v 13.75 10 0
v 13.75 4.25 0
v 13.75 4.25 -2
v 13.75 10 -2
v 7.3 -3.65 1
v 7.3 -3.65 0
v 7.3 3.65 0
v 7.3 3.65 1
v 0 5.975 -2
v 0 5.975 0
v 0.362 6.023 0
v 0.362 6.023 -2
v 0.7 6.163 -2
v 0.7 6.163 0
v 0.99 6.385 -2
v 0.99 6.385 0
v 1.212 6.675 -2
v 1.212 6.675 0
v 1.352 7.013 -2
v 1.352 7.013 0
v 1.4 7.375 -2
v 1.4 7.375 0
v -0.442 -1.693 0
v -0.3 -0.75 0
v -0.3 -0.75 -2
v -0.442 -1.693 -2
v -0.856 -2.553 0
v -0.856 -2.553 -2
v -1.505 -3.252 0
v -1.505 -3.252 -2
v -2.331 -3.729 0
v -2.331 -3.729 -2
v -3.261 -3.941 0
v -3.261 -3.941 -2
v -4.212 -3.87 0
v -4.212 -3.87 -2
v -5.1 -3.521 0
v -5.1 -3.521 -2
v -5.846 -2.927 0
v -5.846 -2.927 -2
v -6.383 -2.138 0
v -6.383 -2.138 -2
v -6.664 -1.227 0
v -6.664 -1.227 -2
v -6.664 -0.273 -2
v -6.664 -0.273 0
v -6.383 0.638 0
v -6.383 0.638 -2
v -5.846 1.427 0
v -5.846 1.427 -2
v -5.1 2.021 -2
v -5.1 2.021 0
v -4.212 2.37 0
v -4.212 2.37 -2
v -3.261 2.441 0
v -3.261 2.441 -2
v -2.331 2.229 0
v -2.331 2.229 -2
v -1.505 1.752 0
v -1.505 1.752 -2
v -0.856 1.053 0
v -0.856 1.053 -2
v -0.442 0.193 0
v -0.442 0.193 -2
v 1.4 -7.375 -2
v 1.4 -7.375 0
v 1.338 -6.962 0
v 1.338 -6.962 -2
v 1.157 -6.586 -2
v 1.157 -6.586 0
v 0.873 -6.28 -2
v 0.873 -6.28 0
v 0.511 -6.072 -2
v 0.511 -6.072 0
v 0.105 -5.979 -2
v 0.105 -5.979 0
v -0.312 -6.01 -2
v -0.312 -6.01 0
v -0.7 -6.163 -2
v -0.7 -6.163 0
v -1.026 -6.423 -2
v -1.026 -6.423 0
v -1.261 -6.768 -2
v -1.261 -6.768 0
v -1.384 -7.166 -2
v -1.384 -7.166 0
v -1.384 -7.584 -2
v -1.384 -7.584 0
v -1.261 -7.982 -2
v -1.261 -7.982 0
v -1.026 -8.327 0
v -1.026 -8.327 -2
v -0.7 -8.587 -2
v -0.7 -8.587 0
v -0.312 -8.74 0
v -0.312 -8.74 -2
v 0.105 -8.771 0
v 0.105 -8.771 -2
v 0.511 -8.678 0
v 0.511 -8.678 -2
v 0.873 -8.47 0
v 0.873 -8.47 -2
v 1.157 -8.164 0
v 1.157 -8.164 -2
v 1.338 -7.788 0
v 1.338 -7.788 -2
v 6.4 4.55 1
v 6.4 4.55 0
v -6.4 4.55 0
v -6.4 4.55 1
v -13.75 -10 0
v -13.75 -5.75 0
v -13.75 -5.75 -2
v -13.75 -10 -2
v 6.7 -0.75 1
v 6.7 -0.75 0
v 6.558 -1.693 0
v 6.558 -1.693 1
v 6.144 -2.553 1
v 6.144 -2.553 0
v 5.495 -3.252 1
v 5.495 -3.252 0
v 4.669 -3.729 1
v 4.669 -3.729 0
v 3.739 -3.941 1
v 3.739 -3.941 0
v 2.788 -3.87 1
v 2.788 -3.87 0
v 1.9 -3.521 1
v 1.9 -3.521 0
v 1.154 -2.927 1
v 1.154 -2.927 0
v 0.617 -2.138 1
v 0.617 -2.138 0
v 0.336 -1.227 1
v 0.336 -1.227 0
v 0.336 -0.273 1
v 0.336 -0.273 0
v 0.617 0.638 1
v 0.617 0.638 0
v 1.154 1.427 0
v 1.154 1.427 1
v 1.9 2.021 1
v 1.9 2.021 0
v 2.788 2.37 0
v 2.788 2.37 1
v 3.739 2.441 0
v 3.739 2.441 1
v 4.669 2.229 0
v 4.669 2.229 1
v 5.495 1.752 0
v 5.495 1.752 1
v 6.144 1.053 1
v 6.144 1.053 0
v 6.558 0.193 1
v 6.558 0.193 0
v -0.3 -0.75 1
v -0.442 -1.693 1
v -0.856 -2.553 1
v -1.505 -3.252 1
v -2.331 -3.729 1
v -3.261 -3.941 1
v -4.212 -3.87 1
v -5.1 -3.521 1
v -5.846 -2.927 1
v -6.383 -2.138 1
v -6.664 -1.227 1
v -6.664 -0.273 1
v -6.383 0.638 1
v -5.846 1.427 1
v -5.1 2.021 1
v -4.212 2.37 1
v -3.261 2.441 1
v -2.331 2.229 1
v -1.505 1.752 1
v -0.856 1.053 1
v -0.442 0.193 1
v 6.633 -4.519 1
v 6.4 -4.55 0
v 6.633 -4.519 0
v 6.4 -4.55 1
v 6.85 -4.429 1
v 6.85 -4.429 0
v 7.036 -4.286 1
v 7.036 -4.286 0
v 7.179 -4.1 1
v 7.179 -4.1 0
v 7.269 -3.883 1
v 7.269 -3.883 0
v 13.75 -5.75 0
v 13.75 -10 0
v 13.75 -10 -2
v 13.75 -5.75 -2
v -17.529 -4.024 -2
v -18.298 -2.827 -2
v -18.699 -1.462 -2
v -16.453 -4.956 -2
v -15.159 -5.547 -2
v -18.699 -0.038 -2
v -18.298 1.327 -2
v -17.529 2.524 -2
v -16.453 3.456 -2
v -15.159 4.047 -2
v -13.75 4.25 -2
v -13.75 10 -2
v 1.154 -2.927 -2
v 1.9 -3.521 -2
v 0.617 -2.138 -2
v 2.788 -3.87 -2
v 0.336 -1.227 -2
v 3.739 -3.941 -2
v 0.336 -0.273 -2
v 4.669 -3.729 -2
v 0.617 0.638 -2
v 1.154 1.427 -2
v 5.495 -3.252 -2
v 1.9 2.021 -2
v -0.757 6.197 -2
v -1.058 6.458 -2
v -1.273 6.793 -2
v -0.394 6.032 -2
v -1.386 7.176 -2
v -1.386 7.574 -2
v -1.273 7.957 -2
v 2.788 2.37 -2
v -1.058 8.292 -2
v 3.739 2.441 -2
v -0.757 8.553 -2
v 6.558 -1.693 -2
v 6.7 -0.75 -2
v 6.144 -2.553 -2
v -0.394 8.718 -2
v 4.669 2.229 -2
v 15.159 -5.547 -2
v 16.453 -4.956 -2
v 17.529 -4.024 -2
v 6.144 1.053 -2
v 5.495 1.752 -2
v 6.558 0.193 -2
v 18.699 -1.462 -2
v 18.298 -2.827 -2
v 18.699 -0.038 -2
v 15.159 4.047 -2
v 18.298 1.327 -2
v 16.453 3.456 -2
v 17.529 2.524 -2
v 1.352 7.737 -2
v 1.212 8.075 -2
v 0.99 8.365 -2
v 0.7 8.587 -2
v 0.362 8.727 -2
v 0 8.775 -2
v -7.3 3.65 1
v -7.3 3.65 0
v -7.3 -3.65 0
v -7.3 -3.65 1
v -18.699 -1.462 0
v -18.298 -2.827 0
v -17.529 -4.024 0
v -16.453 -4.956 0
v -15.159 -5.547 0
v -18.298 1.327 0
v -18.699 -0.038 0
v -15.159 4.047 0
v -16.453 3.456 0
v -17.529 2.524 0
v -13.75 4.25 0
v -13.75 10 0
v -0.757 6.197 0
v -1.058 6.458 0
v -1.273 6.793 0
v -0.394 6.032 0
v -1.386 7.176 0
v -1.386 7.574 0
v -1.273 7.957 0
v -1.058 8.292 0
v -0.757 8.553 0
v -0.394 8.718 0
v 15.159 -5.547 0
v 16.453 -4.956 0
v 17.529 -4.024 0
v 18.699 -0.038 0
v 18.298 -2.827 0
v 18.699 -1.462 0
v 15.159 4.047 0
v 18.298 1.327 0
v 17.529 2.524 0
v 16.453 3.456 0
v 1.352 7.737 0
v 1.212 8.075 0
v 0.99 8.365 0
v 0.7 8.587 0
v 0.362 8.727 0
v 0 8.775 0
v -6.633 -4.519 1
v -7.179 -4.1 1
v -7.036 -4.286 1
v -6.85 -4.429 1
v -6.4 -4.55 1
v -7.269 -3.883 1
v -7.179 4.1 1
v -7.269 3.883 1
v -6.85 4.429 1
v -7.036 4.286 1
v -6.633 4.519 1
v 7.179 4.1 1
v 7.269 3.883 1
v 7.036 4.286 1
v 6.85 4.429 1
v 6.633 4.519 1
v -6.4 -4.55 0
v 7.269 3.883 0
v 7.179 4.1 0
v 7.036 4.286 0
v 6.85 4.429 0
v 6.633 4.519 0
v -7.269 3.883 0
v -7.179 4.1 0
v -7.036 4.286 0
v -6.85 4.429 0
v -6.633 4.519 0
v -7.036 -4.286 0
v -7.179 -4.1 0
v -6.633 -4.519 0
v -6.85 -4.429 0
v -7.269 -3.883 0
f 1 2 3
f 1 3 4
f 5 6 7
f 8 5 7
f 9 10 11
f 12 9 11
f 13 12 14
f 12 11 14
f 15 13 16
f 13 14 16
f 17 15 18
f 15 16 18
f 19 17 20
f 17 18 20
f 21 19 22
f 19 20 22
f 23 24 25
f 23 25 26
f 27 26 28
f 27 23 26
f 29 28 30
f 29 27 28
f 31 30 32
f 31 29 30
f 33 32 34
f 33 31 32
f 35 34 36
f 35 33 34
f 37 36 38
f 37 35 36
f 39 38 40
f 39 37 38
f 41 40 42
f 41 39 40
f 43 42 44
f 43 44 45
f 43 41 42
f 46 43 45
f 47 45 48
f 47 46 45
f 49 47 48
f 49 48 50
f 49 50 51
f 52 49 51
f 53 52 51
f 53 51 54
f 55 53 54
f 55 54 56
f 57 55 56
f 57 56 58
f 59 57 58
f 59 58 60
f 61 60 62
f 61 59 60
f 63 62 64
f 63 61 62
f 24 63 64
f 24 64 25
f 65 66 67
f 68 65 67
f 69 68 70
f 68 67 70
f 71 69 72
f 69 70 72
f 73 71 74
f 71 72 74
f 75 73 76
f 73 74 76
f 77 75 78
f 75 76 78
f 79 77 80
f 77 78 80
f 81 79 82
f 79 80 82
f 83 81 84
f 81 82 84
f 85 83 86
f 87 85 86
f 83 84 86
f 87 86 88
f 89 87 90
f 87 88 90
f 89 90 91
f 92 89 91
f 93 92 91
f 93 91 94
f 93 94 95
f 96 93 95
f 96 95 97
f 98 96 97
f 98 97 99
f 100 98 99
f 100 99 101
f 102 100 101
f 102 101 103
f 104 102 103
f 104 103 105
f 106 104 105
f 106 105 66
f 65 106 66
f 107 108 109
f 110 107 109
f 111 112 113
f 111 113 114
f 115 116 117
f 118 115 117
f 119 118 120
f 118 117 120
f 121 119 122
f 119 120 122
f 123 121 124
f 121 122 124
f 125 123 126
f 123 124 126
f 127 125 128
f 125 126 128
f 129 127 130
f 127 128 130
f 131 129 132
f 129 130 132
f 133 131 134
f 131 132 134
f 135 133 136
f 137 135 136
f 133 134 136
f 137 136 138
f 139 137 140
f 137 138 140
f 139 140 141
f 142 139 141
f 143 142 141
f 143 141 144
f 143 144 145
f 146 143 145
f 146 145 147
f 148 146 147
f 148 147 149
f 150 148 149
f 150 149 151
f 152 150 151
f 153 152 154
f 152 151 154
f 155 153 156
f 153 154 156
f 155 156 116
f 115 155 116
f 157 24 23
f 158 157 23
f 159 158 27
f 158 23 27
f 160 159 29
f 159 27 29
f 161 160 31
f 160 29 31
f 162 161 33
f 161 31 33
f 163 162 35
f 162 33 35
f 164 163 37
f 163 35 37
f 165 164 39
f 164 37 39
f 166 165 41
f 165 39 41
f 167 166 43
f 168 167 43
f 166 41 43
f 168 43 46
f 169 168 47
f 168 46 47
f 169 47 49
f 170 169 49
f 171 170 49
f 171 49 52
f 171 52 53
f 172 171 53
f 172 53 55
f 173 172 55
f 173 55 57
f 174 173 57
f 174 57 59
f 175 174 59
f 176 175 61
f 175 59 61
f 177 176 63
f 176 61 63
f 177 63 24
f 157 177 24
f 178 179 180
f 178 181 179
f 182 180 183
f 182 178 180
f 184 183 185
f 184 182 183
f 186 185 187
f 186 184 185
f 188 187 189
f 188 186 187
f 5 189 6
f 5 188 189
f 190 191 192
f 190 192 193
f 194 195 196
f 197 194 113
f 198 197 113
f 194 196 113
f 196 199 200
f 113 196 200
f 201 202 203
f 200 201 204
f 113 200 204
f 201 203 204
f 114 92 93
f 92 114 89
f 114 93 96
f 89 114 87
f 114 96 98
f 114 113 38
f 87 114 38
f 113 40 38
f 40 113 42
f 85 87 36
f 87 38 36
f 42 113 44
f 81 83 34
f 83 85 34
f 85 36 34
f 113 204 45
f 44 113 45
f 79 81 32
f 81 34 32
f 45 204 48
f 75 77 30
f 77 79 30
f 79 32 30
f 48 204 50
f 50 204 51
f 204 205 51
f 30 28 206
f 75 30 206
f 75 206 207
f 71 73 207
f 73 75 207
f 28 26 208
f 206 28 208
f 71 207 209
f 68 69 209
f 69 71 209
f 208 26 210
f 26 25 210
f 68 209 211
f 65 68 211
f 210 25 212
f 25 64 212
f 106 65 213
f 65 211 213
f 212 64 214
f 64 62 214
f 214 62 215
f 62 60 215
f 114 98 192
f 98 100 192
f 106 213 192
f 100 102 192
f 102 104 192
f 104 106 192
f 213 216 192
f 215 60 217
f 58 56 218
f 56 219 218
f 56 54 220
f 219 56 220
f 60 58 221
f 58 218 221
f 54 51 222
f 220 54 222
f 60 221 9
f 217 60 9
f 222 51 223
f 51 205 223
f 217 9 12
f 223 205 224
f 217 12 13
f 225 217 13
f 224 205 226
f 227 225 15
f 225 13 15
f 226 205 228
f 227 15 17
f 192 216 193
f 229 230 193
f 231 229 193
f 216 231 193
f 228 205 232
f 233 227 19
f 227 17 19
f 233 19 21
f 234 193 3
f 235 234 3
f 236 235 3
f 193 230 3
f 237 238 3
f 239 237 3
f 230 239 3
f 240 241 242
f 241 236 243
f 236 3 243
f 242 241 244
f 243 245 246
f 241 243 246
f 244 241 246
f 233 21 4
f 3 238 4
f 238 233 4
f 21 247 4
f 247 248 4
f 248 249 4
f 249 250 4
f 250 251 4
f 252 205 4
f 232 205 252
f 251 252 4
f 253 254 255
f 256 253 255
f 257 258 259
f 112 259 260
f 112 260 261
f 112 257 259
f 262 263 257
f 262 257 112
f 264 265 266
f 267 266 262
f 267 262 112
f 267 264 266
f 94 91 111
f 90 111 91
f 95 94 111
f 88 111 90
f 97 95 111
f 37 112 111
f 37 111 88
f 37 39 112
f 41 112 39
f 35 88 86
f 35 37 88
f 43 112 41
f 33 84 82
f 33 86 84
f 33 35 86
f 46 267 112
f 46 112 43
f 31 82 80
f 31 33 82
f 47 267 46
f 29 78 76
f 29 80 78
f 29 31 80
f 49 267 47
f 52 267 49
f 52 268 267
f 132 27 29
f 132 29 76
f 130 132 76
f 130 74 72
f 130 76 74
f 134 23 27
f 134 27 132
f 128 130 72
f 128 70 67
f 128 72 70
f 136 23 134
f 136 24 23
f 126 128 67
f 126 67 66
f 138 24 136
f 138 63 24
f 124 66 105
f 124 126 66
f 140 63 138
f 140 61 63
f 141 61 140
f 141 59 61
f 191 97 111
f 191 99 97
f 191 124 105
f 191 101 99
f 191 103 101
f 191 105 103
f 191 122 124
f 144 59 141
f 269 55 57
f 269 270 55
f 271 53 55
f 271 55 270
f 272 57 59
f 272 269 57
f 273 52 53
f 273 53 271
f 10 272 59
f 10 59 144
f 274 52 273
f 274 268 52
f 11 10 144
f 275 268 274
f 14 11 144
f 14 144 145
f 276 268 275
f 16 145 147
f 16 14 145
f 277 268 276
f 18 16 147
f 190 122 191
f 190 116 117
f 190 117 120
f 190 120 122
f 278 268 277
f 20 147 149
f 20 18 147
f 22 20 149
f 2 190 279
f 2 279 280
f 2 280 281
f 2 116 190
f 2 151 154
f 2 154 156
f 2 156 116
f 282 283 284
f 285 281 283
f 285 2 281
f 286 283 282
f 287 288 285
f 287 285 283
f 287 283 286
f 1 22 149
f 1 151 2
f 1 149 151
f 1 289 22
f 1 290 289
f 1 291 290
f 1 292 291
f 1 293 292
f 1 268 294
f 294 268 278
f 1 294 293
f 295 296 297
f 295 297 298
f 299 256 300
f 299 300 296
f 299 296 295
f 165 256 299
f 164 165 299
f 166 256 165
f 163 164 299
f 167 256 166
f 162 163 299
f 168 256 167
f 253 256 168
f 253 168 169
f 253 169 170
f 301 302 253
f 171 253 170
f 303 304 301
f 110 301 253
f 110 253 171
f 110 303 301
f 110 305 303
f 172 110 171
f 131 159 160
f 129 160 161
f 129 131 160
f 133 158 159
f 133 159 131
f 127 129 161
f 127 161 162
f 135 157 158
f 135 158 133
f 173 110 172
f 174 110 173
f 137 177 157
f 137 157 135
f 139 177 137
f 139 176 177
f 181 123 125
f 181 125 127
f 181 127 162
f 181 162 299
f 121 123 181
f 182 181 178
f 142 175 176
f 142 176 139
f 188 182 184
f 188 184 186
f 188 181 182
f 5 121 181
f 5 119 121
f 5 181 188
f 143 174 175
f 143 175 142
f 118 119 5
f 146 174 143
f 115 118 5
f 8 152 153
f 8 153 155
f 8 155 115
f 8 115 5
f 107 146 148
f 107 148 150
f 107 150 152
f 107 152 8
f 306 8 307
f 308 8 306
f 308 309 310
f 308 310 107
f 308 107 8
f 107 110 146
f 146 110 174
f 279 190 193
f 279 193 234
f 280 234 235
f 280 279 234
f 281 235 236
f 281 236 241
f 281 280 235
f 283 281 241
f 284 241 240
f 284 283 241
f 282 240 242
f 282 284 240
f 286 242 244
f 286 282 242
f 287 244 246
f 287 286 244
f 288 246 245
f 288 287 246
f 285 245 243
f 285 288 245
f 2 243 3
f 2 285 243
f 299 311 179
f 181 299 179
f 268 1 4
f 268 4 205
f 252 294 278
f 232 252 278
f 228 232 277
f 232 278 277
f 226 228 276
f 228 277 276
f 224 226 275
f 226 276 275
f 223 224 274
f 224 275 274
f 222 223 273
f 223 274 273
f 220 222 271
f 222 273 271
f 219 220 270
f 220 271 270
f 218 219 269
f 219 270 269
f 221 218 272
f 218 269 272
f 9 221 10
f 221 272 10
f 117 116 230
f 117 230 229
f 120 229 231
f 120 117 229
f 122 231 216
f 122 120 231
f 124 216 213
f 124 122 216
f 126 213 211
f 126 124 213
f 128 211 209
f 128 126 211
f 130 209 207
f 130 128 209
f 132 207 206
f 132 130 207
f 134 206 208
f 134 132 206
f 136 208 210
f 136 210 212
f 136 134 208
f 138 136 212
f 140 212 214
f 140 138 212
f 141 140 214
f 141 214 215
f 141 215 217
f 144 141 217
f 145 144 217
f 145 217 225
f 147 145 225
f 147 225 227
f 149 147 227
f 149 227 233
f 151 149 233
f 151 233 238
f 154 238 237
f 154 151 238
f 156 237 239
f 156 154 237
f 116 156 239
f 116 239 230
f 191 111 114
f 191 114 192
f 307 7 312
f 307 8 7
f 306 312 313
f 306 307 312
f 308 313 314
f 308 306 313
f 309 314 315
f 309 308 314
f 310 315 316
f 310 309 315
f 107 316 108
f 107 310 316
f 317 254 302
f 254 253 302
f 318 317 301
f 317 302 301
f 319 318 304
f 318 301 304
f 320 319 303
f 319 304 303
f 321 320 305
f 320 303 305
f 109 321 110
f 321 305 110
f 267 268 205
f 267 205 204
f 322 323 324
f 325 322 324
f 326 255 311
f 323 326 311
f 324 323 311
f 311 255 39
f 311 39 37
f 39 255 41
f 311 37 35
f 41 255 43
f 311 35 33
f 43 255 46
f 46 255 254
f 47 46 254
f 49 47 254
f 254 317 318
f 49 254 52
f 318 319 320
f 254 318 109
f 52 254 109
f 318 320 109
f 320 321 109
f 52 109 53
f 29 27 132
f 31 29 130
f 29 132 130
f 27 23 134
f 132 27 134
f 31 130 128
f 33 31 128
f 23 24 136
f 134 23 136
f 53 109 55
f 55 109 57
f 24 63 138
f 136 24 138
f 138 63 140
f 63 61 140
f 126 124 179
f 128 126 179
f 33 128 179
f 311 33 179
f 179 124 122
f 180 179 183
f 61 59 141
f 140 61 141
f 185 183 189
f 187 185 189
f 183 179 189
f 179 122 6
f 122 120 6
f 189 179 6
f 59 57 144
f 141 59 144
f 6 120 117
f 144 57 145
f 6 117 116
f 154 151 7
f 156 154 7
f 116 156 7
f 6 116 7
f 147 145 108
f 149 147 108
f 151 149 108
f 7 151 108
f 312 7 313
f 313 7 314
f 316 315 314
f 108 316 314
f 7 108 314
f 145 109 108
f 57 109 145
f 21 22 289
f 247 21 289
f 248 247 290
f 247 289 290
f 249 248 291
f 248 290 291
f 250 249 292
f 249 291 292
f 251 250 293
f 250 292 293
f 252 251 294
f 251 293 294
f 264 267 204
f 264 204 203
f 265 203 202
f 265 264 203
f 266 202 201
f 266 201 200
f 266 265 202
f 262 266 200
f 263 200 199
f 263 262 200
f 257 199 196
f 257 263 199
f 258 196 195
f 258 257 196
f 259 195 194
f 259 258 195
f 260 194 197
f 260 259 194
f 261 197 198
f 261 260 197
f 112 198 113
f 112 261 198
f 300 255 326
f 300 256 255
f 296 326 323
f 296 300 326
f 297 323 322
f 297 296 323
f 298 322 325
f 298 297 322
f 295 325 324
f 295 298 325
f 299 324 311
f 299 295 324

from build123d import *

# Parameters (mm, degrees)
BOSS_EXTRUDE1_DEPTH = 1
BOSS_EXTRUDE2_DEPTH = 2
SKETCH3_R           = 1.4
CUT_EXTRUDE1_DEPTH  = 22.343910138
FILLET1_R           = 0.9


with BuildPart() as part:
    # Sketch1 → Boss-Extrude1 (new body)
    with BuildSketch(Plane.XY):
        with BuildLine():
            Line((-7.3, 4.55), (-7.3, -0.75))
            Line((-7.3, -0.75), (-6.7, -0.75))
            ThreePointArc((-6.7, -0.75), (-3.5, 2.45), (-0.3, -0.75))
            Line((-0.3, -0.75), (0.3, -0.75))
            ThreePointArc((0.3, -0.75), (3.5, 2.45), (6.7, -0.75))
            Line((6.7, -0.75), (7.3, -0.75))
            Line((7.3, -0.75), (7.3, 4.55))
            Line((7.3, 4.55), (-7.3, 4.55))
        make_face()
        with BuildLine():
            Line((-6.7, -0.75), (-7.3, -0.75))
            Line((-7.3, -0.75), (-7.3, -4.55))
            Line((-7.3, -4.55), (7.3, -4.55))
            Line((7.3, -4.55), (7.3, -0.75))
            Line((7.3, -0.75), (6.7, -0.75))
            ThreePointArc((6.7, -0.75), (3.5, -3.95), (0.3, -0.75))
            Line((0.3, -0.75), (-0.3, -0.75))
            ThreePointArc((-0.3, -0.75), (-3.5, -3.95), (-6.7, -0.75))
        make_face()
    extrude(amount=BOSS_EXTRUDE1_DEPTH)

    # Fillet1
    fillet1_edges = [part.edges().sort_by_distance(p)[0] for p in [
        (-7.3, -4.55, 0.5),
        (-7.3, 4.55, 0.5),
        (7.3, 4.55, 0.5),
        (7.3, -4.55, 0.5),
    ]]
    fillet(fillet1_edges, radius=FILLET1_R)


with BuildPart() as body_2:
    # Sketch2 → Boss-Extrude2 (new body)
    with BuildSketch(Plane.XY):
        with BuildLine():
            Line((-13.75, -5.75), (-13.75, -0.75))
            Line((-13.75, -0.75), (-13.75, 4.25))
            ThreePointArc((-13.75, 4.25), (-18.75, -0.75), (-13.75, -5.75))
        make_face()
        with BuildLine():
            ThreePointArc((13.75, -5.75), (18.75, -0.75), (13.75, 4.25))
            Line((13.75, 4.25), (13.75, -0.75))
            Line((13.75, -0.75), (13.75, -5.75))
        make_face()
        Polygon((-7.5, -0.75), (-13.75, -0.75), (-13.75, -5.75), (-13.75, -10), (0, -10), (0, -4.75), (-7.5, -4.75), align=None)
        Polygon((7.5, -4.75), (0, -4.75), (0, -10), (13.75, -10), (13.75, -5.75), (13.75, -0.75), (7.5, -0.75), align=None)
        Polygon((-13.75, 4.25), (-13.75, -0.75), (-7.5, -0.75), (-7.5, 4.75), (0, 4.75), (0, 10), (-13.75, 10), align=None)
        Polygon((0, 10), (0, 4.75), (7.5, 4.75), (7.5, -0.75), (13.75, -0.75), (13.75, 4.25), (13.75, 10), align=None)
        with BuildLine():
            Line((-7.3, 4.55), (-7.3, -0.75))
            Line((-7.3, -0.75), (-6.7, -0.75))
            ThreePointArc((-6.7, -0.75), (-3.5, 2.45), (-0.3, -0.75))
            Line((-0.3, -0.75), (0, -0.75))
            Line((0, -0.75), (0, 4.55))
            Line((0, 4.55), (-7.3, 4.55))
        make_face()
        with BuildLine():
            Line((7.3, 4.55), (0, 4.55))
            Line((0, 4.55), (0, -0.75))
            Line((0, -0.75), (0.3, -0.75))
            ThreePointArc((0.3, -0.75), (3.5, 2.45), (6.7, -0.75))
            Line((6.7, -0.75), (7.3, -0.75))
            Line((7.3, -0.75), (7.3, 4.55))
        make_face()
        with BuildLine():
            Line((0, -0.75), (0, -4.55))
            Line((0, -4.55), (7.3, -4.55))
            Line((7.3, -4.55), (7.3, -0.75))
            Line((7.3, -0.75), (6.7, -0.75))
            ThreePointArc((6.7, -0.75), (3.5, -3.95), (0.3, -0.75))
            Line((0.3, -0.75), (0, -0.75))
        make_face()
        with BuildLine():
            Line((-6.7, -0.75), (-7.3, -0.75))
            Line((-7.3, -0.75), (-7.3, -4.55))
            Line((-7.3, -4.55), (0, -4.55))
            Line((0, -4.55), (0, -0.75))
            Line((0, -0.75), (-0.3, -0.75))
            ThreePointArc((-0.3, -0.75), (-3.5, -3.95), (-6.7, -0.75))
        make_face()
        Polygon((-7.3, -0.75), (-7.5, -0.75), (-7.5, -4.75), (0, -4.75), (0, -4.55), (-7.3, -4.55), align=None)
        Polygon((0, -4.55), (0, -4.75), (7.5, -4.75), (7.5, -0.75), (7.3, -0.75), (7.3, -4.55), align=None)
        Polygon((-7.5, 4.75), (-7.5, -0.75), (-7.3, -0.75), (-7.3, 4.55), (0, 4.55), (0, 4.75), align=None)
        Polygon((7.5, 4.75), (0, 4.75), (0, 4.55), (7.3, 4.55), (7.3, -0.75), (7.5, -0.75), align=None)
    extrude(amount=-BOSS_EXTRUDE2_DEPTH)

    # Sketch3 → Cut-Extrude1 (cut, through all)
    with BuildSketch(Plane.XY):
        with BuildLine():
            ThreePointArc((1.4, 7.375), (0.989949494, 8.364949494), (0, 8.775))
            Line((0, 8.775), (0, 5.975))
            ThreePointArc((0, 5.975), (0.989949494, 6.385050506), (1.4, 7.375))
        make_face()
        with BuildLine():
            Line((0, 5.975), (0, 8.775))
            ThreePointArc((0, 8.775), (-1.4, 7.375), (0, 5.975))
        make_face()
        with Locations((0, -7.375)):
            Circle(SKETCH3_R)
    extrude(amount=-CUT_EXTRUDE1_DEPTH, mode=Mode.SUBTRACT)


solid = Compound([part.part, body_2.part])
